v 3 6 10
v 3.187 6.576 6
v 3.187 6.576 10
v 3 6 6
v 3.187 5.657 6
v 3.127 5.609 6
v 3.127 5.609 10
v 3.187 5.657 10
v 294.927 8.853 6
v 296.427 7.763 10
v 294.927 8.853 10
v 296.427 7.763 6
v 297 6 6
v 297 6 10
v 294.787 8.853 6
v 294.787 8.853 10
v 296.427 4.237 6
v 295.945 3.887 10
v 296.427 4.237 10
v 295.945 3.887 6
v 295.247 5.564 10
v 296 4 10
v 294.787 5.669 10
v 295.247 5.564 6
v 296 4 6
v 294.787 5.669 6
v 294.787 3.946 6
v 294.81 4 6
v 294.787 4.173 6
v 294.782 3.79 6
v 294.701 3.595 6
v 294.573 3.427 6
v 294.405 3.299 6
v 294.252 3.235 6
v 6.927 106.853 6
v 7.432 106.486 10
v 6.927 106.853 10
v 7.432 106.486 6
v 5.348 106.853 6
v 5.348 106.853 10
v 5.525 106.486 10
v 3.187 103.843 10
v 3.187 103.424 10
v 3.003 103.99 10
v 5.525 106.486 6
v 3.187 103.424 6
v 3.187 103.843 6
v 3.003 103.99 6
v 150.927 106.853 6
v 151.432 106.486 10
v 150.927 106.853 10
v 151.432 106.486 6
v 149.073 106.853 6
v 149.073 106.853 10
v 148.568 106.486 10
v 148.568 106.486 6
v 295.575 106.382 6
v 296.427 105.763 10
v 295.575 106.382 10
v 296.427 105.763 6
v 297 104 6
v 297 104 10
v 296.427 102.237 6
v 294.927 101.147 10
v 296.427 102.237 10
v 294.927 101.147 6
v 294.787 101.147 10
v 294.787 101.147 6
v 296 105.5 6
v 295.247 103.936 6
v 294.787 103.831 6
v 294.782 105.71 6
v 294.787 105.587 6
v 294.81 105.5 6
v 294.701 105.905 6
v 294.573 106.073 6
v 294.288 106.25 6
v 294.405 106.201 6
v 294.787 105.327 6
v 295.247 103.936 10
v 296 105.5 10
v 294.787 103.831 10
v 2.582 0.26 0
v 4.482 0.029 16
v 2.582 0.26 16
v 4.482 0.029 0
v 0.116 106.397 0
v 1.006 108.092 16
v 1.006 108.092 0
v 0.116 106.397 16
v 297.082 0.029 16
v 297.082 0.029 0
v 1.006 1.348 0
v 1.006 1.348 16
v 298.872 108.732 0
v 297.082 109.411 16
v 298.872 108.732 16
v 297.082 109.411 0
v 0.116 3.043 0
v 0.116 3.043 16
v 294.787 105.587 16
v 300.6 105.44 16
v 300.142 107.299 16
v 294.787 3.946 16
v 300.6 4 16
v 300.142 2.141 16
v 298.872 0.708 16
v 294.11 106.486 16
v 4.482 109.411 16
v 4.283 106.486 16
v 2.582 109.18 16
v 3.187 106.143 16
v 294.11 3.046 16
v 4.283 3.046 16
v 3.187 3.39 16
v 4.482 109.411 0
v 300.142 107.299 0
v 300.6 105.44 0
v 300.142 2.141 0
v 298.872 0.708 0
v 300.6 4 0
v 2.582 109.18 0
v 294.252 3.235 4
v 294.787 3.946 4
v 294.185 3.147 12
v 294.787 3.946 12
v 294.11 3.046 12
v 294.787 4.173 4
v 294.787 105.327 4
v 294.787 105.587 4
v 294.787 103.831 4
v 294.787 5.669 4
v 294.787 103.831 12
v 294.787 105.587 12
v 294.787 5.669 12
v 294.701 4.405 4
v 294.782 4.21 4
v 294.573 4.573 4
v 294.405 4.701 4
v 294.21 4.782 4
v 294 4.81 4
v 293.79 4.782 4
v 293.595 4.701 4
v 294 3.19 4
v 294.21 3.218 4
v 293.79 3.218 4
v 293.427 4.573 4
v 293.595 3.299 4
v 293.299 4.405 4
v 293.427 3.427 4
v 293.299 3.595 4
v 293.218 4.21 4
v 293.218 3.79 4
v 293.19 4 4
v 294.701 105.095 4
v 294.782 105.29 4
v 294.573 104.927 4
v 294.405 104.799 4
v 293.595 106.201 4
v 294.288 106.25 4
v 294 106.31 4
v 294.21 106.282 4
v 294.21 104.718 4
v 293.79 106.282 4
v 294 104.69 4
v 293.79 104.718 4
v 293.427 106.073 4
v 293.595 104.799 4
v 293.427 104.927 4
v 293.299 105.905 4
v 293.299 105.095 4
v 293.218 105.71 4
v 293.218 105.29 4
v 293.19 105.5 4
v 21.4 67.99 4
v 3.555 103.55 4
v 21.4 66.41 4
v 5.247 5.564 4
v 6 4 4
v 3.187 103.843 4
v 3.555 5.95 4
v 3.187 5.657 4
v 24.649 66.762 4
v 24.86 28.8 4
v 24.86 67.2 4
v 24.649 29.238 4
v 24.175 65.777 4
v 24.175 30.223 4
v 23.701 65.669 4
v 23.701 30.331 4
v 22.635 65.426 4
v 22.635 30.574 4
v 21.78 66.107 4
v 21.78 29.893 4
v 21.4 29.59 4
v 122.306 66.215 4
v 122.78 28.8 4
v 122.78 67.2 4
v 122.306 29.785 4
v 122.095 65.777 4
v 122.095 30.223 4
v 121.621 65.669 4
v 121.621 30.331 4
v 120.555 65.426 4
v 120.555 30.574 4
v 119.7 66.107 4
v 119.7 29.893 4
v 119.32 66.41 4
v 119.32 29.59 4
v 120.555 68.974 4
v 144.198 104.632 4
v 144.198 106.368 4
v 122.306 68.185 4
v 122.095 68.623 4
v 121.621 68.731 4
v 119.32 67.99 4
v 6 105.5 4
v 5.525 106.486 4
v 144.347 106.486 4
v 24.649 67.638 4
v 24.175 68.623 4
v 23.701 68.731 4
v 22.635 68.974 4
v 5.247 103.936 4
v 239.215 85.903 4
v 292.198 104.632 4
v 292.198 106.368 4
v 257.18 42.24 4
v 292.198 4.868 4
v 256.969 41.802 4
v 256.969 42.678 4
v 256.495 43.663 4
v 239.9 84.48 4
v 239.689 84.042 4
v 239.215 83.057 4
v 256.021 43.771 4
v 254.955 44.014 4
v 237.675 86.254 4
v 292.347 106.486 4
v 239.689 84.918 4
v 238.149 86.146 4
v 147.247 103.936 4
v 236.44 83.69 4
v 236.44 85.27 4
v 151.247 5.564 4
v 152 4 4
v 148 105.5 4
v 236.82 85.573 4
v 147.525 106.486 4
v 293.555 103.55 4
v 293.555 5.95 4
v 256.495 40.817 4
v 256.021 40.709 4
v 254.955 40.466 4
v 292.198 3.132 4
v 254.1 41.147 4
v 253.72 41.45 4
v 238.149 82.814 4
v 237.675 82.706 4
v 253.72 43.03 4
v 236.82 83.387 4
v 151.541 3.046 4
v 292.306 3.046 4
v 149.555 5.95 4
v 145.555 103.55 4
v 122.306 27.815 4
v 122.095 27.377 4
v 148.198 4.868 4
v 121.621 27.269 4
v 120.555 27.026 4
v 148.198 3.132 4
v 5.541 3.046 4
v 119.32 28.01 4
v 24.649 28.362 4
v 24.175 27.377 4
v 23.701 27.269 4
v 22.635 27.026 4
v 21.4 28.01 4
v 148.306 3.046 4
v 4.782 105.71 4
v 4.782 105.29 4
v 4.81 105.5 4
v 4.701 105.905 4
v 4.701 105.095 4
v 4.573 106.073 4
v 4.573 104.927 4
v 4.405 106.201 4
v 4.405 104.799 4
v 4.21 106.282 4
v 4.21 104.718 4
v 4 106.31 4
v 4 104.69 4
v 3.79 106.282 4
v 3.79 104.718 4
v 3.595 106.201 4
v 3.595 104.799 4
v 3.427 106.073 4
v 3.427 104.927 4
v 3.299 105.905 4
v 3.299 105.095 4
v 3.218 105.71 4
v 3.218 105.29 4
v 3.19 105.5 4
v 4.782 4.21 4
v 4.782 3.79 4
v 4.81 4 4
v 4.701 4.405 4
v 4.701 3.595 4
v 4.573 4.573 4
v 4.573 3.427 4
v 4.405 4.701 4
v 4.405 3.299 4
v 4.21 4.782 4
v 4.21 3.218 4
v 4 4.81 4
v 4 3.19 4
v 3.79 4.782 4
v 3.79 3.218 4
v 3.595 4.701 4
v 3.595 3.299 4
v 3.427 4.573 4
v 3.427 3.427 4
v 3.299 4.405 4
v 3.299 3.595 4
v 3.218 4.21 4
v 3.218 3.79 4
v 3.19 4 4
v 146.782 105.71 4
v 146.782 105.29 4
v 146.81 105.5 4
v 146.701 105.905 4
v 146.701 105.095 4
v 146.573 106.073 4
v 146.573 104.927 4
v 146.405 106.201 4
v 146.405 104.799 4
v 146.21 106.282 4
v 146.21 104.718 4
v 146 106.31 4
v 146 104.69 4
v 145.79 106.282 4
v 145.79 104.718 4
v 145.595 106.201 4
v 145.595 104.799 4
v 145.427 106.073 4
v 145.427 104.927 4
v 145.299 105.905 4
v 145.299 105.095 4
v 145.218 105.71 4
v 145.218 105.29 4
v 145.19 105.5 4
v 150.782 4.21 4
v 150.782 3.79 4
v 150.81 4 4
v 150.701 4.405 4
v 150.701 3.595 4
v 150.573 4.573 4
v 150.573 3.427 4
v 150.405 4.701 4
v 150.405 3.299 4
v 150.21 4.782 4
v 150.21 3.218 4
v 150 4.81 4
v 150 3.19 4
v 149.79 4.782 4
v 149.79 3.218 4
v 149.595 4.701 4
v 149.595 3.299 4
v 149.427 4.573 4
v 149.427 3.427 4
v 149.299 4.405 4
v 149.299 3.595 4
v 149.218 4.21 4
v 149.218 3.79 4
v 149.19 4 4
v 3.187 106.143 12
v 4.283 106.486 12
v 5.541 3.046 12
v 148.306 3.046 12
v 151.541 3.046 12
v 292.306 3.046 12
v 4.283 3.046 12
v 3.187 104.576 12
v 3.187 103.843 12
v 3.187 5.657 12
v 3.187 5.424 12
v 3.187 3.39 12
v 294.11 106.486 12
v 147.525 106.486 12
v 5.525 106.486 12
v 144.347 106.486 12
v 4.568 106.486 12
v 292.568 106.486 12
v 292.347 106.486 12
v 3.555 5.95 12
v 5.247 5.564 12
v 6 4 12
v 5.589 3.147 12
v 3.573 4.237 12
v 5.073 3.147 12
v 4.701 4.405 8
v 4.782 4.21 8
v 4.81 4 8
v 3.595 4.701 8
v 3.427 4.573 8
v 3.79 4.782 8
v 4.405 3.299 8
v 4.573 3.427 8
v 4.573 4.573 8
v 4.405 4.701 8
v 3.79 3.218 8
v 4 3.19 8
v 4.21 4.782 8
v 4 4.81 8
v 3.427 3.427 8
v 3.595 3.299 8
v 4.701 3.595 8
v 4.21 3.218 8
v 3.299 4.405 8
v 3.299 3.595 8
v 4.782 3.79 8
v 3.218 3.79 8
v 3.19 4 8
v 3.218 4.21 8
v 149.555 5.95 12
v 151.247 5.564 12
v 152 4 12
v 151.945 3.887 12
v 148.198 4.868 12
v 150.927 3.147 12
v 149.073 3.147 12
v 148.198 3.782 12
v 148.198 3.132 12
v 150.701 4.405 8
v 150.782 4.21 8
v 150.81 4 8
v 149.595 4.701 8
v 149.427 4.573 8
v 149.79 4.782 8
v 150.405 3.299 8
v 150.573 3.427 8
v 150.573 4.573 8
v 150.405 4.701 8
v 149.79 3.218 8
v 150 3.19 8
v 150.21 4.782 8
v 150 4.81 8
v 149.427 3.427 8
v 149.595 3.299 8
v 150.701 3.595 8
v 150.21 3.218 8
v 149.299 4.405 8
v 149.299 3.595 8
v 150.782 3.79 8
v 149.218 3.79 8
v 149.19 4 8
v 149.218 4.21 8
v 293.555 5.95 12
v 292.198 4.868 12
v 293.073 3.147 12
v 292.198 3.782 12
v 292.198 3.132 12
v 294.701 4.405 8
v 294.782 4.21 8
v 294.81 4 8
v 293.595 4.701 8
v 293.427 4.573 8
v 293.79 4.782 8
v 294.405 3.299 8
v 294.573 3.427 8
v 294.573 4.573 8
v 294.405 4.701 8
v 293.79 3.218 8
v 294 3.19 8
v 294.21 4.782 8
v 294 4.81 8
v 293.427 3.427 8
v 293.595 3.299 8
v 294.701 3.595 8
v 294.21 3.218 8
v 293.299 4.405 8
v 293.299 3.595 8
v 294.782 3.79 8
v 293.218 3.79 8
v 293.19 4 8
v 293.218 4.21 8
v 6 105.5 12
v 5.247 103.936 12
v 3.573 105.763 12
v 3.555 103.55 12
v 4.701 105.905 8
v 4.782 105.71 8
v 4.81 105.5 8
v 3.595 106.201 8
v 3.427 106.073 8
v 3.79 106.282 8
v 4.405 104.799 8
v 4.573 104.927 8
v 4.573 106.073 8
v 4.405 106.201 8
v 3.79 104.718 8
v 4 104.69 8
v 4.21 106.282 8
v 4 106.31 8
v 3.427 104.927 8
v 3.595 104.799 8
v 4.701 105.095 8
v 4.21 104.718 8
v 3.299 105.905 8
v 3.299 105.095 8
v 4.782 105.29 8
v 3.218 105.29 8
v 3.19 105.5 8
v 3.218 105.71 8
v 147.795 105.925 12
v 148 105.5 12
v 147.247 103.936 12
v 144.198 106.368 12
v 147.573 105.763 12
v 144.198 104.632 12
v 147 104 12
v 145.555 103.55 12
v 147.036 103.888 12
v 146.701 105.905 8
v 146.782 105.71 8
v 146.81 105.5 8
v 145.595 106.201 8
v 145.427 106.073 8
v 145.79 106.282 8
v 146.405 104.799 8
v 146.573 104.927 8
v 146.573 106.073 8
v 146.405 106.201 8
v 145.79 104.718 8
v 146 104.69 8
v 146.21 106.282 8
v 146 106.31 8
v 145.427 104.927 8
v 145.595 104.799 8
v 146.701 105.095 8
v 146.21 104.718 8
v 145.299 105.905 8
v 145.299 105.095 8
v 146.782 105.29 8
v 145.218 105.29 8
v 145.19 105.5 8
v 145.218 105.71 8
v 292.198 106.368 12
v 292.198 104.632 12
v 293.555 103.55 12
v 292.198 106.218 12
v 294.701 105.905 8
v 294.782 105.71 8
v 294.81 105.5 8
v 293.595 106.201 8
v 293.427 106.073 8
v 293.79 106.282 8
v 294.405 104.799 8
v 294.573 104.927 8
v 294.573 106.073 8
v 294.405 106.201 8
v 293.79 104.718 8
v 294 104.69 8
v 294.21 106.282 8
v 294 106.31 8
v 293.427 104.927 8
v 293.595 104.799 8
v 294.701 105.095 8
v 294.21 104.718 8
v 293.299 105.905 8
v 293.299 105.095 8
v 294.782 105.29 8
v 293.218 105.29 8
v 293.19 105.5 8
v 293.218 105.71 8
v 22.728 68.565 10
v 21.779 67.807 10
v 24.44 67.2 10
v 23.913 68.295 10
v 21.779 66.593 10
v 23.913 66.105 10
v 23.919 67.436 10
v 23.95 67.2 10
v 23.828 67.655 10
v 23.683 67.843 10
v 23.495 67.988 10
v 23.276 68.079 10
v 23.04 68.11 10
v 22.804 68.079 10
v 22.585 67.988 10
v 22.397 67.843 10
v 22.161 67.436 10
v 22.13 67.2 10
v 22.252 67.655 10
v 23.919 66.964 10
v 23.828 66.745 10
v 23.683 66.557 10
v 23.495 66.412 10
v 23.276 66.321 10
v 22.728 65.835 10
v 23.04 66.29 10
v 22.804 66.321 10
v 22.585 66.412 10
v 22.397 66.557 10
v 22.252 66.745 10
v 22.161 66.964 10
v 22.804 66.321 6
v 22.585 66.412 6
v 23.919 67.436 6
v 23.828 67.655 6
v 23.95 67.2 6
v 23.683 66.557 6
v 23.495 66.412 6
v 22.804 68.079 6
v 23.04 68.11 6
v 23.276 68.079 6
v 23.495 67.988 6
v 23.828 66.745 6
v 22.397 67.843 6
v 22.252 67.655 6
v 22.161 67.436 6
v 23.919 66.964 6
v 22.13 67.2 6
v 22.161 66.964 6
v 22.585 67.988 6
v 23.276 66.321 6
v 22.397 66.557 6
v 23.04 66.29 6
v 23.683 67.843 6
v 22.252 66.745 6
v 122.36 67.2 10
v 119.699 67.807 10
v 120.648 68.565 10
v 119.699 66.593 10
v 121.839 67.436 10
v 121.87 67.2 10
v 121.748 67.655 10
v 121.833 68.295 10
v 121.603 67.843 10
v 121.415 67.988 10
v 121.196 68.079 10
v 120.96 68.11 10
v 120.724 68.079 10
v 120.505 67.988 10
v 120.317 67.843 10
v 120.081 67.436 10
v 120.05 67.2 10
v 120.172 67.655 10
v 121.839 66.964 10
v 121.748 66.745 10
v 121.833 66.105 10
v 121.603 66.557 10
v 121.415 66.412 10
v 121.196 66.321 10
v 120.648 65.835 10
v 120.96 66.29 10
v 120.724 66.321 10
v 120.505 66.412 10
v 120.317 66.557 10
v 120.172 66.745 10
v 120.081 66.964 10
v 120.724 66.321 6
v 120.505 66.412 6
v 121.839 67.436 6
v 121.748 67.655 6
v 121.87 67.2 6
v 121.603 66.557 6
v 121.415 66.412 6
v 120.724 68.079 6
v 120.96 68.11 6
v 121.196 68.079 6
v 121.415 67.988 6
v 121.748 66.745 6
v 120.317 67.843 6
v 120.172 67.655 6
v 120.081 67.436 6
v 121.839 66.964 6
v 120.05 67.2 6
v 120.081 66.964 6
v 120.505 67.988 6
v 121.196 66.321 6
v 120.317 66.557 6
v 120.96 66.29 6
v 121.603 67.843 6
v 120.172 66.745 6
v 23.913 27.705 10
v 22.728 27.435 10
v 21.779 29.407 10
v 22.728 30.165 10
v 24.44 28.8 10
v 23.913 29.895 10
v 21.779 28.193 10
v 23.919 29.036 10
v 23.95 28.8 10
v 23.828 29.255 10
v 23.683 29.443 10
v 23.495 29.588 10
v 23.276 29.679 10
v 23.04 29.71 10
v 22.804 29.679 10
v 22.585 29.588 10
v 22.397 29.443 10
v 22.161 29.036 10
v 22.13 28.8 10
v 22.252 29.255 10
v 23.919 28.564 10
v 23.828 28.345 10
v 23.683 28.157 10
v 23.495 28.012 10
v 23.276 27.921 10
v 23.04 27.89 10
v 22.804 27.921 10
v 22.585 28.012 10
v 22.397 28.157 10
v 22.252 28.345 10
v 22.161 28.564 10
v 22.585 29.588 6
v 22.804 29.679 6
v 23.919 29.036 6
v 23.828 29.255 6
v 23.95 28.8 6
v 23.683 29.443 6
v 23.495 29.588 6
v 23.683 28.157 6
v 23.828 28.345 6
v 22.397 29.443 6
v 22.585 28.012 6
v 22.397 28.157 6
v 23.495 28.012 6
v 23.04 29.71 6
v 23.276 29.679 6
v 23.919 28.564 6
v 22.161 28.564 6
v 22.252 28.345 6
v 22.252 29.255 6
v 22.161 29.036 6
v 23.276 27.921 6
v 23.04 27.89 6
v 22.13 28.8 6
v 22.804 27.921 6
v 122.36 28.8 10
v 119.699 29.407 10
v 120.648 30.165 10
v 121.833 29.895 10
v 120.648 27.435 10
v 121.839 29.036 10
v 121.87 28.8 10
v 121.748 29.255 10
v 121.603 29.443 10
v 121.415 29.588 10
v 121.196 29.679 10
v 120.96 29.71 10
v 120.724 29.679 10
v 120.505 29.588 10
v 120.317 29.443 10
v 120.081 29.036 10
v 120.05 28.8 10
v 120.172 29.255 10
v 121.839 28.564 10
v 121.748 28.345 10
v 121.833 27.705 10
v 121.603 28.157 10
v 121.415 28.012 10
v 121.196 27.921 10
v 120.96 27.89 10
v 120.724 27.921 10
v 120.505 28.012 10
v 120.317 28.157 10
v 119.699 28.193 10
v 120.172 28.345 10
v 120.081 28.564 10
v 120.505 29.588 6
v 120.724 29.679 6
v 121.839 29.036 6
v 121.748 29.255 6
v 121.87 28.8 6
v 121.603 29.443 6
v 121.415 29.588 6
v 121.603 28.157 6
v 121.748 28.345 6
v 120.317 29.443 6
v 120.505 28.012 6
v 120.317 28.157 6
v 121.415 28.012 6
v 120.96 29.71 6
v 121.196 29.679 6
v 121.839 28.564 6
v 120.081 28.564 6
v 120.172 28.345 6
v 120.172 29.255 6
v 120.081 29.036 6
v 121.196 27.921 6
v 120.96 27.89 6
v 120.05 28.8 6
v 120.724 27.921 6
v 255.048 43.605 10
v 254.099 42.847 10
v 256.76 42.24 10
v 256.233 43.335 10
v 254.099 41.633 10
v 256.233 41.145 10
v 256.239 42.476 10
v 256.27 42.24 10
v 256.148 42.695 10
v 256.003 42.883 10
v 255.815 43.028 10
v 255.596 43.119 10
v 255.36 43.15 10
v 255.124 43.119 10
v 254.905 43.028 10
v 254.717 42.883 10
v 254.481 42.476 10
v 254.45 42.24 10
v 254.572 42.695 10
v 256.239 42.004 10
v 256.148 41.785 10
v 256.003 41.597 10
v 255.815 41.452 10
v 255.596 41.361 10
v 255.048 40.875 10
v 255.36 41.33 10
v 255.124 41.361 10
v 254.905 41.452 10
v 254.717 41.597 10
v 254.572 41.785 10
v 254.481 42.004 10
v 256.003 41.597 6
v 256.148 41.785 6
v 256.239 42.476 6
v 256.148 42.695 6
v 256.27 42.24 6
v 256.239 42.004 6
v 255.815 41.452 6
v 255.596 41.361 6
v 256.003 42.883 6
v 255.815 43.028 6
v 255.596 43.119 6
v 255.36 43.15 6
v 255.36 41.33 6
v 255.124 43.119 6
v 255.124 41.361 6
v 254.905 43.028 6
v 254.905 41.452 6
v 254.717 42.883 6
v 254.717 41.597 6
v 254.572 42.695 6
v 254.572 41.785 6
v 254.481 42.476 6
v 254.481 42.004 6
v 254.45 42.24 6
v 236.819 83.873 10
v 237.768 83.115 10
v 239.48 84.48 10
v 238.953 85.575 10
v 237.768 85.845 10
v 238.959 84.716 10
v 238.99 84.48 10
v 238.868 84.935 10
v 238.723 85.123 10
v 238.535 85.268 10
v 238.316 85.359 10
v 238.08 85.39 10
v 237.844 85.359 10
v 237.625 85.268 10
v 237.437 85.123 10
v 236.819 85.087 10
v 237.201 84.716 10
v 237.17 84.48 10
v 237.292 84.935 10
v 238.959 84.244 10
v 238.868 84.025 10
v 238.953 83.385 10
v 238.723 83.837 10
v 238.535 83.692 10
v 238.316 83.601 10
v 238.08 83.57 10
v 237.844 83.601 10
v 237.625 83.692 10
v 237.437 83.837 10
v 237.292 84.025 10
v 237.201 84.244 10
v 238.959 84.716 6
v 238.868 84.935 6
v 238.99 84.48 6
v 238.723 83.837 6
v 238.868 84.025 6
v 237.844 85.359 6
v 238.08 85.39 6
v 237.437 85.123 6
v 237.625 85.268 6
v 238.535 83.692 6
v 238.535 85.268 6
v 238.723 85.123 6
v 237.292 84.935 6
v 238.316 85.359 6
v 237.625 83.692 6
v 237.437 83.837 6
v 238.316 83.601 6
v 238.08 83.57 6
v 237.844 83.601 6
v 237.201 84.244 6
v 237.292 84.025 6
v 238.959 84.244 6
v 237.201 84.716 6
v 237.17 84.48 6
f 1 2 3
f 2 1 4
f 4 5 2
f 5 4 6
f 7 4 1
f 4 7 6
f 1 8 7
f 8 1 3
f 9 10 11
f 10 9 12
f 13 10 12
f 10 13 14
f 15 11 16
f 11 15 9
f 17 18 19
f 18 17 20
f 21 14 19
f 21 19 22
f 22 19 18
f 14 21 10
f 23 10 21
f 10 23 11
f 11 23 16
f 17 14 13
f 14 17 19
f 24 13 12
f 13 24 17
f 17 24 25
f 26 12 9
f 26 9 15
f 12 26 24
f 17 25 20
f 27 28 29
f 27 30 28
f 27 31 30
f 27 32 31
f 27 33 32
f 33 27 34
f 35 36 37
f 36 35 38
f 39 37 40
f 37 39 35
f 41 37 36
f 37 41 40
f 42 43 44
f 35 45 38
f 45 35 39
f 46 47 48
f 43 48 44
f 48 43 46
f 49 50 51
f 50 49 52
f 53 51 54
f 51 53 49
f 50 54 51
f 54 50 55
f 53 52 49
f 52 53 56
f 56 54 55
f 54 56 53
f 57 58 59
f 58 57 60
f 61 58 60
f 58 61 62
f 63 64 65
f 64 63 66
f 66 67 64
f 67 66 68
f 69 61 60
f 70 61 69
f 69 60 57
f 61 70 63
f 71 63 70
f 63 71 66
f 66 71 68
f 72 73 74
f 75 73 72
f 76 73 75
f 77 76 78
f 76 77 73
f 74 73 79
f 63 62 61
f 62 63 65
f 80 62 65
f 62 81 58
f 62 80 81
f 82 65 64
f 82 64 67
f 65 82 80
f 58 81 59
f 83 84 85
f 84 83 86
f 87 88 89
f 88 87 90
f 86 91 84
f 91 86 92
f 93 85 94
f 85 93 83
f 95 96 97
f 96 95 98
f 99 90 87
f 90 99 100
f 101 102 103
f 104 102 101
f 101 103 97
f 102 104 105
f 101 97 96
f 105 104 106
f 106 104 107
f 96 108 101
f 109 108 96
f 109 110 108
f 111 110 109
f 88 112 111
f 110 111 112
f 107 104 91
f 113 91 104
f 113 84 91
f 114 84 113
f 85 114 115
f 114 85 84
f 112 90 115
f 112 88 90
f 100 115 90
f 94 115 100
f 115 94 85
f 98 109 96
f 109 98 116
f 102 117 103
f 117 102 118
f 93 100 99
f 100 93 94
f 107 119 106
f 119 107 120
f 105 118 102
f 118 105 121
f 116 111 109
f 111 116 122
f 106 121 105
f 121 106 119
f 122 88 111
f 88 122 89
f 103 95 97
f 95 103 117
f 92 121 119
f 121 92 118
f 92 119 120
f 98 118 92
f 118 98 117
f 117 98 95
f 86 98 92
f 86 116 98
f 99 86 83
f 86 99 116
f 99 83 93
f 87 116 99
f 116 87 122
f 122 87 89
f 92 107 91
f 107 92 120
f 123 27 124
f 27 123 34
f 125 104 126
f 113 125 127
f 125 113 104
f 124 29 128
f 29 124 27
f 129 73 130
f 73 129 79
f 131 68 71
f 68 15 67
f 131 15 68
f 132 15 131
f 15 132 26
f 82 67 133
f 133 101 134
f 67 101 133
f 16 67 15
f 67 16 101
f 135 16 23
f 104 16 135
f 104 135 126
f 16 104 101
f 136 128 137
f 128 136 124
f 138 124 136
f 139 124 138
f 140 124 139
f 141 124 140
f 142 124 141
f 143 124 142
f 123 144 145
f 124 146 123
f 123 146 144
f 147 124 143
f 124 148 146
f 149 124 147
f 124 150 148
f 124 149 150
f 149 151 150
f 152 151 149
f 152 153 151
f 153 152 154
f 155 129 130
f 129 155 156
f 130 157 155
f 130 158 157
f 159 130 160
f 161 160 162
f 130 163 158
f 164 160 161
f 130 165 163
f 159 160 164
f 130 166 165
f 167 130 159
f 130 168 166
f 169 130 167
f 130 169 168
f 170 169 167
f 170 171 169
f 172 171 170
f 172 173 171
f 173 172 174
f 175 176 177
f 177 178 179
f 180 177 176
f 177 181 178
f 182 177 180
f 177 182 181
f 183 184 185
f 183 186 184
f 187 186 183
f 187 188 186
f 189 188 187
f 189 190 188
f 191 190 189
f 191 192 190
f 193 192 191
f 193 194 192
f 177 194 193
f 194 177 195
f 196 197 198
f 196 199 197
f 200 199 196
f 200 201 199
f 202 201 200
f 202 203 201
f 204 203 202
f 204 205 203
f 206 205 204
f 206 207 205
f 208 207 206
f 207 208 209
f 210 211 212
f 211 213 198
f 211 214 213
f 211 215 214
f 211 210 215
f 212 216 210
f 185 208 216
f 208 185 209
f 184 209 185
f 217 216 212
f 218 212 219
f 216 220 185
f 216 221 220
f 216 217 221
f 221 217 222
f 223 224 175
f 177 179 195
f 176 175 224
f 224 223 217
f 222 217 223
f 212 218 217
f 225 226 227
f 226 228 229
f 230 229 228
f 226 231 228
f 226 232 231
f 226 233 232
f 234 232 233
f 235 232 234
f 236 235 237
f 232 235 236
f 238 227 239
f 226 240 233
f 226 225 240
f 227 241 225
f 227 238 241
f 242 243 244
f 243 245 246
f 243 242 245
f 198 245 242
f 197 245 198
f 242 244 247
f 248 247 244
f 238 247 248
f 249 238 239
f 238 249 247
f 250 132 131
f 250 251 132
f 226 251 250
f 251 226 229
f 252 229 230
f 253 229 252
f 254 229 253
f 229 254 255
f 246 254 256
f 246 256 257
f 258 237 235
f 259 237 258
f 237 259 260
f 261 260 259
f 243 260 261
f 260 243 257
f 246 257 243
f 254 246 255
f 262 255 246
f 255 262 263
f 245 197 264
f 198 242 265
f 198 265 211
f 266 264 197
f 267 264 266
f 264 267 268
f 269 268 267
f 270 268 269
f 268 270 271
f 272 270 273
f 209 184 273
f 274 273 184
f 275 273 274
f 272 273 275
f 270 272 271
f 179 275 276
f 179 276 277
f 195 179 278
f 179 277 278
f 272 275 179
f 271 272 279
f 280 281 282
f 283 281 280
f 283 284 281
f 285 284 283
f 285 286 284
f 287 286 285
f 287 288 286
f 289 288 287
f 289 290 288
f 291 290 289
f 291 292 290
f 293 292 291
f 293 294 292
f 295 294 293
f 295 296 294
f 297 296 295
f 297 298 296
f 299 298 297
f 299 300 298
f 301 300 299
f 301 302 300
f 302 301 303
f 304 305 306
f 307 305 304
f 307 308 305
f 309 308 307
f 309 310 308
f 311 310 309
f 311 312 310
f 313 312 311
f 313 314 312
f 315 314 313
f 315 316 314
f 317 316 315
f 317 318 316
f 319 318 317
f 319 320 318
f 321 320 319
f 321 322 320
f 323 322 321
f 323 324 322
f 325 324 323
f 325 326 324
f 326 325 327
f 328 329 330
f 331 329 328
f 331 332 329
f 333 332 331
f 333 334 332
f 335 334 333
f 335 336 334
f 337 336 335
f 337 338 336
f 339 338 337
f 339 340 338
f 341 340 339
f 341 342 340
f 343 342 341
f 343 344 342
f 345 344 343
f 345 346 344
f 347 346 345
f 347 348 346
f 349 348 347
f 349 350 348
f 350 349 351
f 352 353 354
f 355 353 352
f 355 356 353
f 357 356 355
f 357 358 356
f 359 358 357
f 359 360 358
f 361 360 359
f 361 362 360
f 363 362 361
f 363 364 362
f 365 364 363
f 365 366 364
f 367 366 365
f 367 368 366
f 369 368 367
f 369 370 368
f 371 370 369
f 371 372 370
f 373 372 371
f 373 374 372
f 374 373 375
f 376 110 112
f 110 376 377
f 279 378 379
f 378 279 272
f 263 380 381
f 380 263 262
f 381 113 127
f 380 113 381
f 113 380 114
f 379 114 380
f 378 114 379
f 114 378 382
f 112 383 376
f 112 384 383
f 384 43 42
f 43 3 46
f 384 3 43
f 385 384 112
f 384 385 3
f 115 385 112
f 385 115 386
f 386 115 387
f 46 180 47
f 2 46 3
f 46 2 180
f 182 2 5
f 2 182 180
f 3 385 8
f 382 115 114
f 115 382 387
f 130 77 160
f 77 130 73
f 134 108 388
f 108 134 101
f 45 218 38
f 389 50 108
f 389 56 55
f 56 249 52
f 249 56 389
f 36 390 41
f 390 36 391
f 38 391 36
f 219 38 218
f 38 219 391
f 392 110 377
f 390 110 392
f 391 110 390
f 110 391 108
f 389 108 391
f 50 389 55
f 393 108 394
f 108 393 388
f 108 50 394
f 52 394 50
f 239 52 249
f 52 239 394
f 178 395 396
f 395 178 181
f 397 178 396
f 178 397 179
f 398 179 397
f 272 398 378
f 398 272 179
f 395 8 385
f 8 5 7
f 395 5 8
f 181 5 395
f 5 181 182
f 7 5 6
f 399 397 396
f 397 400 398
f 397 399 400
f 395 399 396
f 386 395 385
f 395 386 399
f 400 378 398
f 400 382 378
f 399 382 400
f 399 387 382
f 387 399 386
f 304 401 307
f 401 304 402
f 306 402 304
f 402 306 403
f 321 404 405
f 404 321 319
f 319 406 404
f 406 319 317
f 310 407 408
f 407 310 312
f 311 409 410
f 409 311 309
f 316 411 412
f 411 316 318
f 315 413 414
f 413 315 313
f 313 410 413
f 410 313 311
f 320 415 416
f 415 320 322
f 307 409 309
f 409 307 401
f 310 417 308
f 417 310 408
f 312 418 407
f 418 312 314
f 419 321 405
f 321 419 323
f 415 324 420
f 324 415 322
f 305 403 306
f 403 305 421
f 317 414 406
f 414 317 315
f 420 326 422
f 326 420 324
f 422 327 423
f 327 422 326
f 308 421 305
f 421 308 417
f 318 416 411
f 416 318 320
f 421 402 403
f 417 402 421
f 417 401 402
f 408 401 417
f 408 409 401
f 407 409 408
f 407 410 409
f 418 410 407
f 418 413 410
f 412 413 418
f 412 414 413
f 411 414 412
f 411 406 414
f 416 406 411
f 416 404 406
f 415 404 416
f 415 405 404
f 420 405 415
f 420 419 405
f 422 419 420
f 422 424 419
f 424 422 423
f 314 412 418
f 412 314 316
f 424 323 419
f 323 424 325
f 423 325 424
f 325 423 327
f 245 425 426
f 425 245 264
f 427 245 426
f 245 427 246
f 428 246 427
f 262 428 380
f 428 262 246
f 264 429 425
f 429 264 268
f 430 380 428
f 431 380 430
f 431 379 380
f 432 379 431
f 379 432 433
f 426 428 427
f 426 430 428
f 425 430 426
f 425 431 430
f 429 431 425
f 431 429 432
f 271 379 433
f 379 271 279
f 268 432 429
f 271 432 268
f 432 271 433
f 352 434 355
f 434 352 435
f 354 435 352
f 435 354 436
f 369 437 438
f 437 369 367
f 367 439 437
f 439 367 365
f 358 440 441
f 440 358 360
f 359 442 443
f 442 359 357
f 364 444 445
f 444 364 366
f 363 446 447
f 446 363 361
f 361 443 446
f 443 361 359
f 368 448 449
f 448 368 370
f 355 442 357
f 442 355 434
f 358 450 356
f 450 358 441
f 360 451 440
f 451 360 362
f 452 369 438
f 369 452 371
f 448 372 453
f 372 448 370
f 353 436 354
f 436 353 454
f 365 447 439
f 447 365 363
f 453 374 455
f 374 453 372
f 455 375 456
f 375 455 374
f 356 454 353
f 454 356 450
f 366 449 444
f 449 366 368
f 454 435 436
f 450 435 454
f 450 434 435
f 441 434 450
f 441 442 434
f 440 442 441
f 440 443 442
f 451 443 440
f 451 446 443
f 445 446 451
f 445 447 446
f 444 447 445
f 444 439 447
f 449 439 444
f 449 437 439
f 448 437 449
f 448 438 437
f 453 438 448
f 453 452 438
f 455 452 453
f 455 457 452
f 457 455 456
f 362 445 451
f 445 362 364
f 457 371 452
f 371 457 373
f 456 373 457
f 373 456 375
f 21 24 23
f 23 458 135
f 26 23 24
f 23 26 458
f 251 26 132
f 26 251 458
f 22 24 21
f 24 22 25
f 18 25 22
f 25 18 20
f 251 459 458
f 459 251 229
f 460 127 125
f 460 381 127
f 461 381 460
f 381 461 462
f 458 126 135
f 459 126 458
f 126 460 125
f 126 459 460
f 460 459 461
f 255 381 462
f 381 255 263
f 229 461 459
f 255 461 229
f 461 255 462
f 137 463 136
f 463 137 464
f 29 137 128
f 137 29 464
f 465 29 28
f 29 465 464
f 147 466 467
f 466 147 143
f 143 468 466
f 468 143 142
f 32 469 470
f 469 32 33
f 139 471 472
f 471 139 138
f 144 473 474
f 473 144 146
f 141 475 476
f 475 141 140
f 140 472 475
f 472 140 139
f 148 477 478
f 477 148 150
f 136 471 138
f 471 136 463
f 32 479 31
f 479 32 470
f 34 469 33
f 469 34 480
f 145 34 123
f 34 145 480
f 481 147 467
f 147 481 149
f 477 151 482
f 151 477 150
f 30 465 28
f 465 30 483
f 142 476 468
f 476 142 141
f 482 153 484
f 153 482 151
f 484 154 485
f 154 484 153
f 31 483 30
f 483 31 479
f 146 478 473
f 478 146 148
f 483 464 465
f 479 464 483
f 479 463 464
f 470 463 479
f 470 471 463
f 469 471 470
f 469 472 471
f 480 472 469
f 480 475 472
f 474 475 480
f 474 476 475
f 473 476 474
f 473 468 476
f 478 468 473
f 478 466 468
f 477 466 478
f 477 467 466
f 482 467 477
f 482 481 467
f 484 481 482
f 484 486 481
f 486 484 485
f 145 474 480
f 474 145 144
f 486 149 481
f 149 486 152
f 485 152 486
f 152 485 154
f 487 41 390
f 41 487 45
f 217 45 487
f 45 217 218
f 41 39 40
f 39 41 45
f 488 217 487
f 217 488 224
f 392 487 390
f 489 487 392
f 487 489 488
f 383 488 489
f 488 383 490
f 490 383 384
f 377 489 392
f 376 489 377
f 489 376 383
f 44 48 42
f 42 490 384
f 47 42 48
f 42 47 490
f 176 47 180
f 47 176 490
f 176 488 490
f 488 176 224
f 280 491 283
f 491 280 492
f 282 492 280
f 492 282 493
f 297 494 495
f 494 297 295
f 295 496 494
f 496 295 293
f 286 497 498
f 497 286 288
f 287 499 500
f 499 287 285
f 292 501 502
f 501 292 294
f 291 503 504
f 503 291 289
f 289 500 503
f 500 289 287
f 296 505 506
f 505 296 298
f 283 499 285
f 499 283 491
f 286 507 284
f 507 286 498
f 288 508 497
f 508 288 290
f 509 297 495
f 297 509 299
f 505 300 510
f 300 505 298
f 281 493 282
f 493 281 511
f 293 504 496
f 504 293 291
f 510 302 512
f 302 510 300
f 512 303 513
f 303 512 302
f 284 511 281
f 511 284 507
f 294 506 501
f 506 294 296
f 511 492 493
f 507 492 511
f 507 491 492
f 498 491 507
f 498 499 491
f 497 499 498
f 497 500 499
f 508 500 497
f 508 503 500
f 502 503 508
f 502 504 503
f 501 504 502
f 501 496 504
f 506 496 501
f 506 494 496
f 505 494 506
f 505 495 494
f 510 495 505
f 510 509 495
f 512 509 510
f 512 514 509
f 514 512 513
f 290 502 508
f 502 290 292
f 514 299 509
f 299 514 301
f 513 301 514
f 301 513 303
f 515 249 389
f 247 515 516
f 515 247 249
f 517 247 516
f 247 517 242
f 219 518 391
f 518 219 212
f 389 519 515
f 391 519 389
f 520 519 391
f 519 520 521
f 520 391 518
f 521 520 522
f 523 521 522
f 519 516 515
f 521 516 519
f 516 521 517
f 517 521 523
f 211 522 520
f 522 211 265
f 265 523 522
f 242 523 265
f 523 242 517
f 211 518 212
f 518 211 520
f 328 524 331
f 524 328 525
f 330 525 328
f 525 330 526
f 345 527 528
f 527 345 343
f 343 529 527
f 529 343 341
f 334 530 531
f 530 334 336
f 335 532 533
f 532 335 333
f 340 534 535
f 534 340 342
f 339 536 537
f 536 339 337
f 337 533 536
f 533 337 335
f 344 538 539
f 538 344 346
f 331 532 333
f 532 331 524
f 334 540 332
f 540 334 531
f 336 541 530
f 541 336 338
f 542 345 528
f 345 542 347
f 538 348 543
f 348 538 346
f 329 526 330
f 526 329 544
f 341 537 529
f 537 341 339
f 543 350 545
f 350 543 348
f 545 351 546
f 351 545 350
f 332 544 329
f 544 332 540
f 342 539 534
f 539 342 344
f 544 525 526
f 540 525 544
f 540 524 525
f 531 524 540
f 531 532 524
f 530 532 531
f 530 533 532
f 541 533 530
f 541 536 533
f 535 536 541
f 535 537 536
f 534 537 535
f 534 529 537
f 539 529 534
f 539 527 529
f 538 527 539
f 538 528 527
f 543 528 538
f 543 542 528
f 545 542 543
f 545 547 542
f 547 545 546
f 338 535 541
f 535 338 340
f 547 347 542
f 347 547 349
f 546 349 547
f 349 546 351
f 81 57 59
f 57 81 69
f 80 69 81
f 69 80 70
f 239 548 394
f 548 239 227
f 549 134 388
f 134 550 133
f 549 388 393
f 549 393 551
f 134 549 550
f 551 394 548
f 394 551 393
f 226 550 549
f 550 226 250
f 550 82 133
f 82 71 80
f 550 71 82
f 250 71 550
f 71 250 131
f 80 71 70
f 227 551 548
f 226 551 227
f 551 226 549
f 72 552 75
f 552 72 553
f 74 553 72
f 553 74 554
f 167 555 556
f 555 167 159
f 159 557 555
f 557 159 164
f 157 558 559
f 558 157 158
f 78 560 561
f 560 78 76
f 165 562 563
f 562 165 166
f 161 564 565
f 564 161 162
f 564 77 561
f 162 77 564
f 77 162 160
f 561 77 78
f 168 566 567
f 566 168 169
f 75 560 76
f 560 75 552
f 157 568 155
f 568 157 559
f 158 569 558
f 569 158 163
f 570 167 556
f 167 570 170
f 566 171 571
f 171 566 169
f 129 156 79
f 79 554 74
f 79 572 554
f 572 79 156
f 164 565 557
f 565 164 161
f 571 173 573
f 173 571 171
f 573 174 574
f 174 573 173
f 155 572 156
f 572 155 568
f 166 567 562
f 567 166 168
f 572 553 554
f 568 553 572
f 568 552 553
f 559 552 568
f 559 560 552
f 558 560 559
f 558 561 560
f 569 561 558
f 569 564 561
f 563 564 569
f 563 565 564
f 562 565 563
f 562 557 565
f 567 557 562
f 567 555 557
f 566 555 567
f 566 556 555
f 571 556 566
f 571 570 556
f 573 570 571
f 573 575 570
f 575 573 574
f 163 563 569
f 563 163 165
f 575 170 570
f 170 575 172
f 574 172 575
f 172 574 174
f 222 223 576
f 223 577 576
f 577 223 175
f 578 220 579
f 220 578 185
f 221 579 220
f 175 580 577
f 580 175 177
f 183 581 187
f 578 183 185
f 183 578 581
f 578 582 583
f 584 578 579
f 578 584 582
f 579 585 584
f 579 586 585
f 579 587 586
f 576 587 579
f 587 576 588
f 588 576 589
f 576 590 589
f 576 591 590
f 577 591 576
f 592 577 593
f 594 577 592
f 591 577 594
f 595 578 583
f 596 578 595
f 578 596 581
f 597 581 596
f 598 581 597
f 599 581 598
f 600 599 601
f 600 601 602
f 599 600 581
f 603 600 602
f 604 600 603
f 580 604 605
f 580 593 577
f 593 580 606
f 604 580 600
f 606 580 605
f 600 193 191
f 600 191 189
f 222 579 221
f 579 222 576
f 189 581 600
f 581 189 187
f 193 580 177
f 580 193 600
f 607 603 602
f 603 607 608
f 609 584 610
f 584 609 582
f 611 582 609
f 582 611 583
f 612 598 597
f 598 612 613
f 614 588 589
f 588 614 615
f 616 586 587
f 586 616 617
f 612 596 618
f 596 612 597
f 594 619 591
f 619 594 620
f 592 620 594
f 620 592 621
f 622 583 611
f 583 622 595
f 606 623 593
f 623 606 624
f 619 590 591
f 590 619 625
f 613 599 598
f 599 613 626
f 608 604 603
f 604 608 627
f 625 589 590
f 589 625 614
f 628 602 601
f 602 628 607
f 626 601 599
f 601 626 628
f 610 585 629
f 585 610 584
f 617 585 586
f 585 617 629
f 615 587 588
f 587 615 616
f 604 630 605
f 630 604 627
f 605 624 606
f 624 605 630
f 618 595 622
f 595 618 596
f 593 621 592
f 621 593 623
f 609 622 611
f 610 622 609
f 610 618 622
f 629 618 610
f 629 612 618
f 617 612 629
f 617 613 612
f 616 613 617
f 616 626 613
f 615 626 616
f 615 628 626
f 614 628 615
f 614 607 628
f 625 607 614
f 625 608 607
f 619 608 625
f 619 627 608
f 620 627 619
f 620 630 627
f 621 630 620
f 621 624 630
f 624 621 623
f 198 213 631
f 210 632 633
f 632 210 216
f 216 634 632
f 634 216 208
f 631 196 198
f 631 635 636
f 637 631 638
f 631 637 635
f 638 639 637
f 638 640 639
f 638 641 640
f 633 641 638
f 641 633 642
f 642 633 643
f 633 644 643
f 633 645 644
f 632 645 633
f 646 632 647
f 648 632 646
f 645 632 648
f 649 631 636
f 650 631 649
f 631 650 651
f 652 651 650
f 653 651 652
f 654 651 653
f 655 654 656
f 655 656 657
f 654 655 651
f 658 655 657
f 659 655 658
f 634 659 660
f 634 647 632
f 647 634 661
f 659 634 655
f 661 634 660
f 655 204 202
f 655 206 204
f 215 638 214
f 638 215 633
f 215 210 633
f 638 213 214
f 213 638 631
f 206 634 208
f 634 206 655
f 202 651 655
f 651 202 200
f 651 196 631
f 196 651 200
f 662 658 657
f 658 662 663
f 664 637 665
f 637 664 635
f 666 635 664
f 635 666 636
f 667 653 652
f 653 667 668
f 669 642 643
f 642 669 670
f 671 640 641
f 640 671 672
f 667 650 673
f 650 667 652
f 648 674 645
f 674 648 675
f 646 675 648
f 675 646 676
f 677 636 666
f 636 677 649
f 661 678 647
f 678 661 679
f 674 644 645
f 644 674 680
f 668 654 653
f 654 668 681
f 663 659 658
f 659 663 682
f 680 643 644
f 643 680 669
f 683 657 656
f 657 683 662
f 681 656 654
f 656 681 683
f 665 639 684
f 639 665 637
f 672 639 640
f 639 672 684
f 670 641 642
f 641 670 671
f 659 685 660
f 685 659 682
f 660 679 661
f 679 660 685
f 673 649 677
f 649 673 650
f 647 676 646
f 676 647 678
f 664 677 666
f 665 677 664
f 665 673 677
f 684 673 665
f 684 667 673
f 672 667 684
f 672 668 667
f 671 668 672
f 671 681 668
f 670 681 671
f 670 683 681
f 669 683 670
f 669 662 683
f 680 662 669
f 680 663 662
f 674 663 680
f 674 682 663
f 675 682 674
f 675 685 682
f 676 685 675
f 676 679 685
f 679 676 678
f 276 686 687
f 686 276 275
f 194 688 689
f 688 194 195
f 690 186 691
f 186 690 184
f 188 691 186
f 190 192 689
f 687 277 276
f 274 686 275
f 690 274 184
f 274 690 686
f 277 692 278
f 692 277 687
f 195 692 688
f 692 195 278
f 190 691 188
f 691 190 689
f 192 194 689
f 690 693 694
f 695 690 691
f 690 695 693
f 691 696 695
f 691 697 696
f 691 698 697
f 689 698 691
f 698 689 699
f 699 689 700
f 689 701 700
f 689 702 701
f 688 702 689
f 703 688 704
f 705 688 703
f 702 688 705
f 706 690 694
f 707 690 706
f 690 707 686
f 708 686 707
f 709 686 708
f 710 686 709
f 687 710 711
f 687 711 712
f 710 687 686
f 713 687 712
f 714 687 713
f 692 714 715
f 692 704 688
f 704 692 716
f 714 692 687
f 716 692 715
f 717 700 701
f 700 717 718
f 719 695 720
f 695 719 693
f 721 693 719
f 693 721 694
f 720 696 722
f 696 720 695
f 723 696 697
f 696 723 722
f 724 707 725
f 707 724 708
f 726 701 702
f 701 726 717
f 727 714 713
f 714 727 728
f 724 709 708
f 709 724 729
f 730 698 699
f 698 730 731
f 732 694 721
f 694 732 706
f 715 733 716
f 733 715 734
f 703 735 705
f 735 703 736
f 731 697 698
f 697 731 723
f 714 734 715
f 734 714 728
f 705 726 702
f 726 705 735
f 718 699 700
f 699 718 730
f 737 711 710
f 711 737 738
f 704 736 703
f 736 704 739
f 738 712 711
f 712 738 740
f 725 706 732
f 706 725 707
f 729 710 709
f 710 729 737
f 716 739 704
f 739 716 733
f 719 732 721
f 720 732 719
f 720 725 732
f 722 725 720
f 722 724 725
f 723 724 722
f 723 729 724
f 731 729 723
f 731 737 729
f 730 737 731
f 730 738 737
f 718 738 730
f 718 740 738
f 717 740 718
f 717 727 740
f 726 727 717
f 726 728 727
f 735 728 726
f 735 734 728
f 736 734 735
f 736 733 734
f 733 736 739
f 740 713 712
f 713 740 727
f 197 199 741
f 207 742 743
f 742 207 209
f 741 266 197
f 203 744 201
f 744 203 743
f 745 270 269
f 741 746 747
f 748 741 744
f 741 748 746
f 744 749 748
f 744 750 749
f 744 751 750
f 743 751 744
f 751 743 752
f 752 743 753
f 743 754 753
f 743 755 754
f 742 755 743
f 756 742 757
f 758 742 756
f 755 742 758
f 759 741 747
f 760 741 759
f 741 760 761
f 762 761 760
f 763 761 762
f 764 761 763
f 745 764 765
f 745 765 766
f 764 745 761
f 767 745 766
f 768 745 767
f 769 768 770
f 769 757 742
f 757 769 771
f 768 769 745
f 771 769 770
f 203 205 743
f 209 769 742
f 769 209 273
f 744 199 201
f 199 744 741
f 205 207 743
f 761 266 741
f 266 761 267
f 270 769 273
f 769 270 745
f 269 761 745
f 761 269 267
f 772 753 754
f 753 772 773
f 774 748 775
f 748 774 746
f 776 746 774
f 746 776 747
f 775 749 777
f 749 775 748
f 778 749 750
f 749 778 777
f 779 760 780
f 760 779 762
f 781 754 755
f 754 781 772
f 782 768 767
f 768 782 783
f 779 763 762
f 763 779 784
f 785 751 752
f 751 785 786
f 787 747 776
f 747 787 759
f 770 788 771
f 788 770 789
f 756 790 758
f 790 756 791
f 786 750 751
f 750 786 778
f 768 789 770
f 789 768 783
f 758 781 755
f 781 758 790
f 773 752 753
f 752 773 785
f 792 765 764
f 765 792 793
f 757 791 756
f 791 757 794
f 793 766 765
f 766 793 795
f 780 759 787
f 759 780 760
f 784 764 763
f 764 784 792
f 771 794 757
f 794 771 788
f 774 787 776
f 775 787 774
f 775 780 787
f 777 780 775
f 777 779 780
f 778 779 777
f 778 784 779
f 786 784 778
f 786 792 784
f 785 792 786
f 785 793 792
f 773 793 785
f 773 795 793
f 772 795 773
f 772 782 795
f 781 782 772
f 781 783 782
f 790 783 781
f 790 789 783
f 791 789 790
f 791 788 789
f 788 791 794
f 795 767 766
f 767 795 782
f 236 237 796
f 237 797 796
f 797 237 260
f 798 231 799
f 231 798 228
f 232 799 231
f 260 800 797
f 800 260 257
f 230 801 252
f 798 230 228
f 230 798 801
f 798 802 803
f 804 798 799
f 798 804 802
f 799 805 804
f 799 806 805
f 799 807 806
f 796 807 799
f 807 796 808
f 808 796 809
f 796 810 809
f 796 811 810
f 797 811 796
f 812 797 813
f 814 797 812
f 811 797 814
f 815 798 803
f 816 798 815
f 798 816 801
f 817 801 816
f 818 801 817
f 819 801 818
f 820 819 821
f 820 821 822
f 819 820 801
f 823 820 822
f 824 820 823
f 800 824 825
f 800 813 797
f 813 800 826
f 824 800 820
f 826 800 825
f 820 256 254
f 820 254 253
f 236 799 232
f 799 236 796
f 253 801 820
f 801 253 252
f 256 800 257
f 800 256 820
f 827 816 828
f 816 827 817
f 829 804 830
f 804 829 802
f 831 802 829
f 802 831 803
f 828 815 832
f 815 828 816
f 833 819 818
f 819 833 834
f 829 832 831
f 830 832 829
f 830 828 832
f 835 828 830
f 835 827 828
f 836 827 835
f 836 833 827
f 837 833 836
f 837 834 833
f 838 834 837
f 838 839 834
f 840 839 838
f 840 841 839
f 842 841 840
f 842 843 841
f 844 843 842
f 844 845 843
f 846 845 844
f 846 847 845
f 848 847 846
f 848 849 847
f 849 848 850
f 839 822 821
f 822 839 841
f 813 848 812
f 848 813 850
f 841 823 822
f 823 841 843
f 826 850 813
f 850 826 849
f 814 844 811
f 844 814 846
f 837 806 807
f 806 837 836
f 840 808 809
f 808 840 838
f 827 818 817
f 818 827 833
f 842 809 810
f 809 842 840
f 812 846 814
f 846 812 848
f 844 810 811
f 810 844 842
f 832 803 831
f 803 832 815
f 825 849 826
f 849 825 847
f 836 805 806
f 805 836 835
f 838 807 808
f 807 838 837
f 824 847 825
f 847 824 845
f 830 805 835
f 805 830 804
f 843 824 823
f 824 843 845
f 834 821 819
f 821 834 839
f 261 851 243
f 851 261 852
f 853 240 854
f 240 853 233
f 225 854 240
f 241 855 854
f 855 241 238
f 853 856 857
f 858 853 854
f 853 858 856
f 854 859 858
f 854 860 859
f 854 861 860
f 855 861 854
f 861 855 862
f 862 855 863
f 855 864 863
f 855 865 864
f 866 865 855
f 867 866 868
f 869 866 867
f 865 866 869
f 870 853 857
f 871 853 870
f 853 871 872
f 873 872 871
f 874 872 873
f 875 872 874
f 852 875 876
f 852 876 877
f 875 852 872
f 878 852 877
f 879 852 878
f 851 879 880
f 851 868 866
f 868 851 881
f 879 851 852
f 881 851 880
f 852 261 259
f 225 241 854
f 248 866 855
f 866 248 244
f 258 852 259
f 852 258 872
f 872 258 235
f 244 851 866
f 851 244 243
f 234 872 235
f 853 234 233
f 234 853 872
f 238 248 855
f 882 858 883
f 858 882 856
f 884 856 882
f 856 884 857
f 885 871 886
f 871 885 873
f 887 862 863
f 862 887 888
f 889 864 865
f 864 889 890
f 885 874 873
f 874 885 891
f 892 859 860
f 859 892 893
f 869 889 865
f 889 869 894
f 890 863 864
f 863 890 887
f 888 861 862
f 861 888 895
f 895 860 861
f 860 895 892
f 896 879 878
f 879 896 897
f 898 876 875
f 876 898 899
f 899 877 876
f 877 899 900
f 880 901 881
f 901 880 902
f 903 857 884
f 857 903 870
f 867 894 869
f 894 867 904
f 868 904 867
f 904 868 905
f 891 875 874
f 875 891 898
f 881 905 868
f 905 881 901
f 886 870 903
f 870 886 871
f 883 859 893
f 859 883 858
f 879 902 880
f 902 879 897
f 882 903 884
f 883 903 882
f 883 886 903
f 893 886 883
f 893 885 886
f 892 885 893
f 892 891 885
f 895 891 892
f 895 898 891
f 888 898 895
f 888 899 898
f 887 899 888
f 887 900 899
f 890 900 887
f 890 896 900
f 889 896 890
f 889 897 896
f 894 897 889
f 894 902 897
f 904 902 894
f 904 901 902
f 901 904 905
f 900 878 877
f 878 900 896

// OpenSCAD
//Thickness of entire plate
plateThickness = 6;
//Unit square length, from Cherry MX data sheet
lkey = 19.2;
//Hole size, from Cherry MX data sheet
holesize = 14;

//length, in units, of board
width = 15.5;
//Height, in units, of board
height = 5.7;

//Radius of mounting holes
mountingholeradius = 1.11;
//height of switch clasp cutouts
cutoutheight = 3;
//width of switch clasp cutouts
cutoutwidth = 1;

//calculated vars
holediff = lkey - holesize;
w = width * lkey;
h = height * lkey;

TOP_PLATE_FILE = "top_plate_rev5.dxf";


layout = [
//start column 0
[[0,0],1.5],
  [[0,1],1.5],
  [[0,2],1.5],
  [[0,3],1.5],
  [[0,4],1.5],
  //start column 1
  [[1.5,0],1],
  [[1.5,1],1],
  [[1.5,2],1],
  [[1.5,3],1],
  [[1.5,4],1],
  //start column 2
  [[2.5,0],1],
  [[2.5,1],1],
  [[2.5,2],1],
  [[2.5,3],1],
  [[2.5,4],1],
  //start column 3
  [[3.5,0],1],
  [[3.5,1],1],
  [[3.5,2],1],
  [[3.5,3],1],
  [[3.5,4],1],
  //start column 4
  [[4.5,0],1],
  [[4.5,1],1],
  [[4.5,2],1],
  [[4.5,3],1],
  [[4.5,4],2],//SPACEBAR
  //start column 5
  [[5.5,0],1],
  [[5.5,1],1],
  [[5.5,2],1],
  [[5.5,3],1],
  //start column 6
  [[7,0],1],
  [[7,1],1],
  [[7,2],1],
  [[7,3],1],
  [[7,4],2],//SPACEBAR
  //start column 7
  [[8,0],1],
  [[8,1],1],
  [[8,2],1],
  [[8,3],1],
  //start column 8
  [[9,0],1],
  [[9,1],1],
  [[9,2],1],
  [[9,3],1],
  [[9,4],1],
  //start column 9
  [[10,0],1],
  [[10,1],1],
  [[10,2],1],
  [[10,3],1],
  [[10,4],1],
  //start column 10
  [[11,0],1],
  [[11,1],1],
  [[11,2],1],
  [[11,3],1],
  [[11,4],1],
  //start column 11
  [[12,0],1],
  [[12,1],1],
  [[12,2],1],
  [[12,3],1],
  [[12,4],1],
  //start column 12
  [[13,0],1],
  [[13,1],1],
  [[13,2],2],//ENTER
  [[13,3],1],
  [[13,4],1],
  //start column 13
  [[14,0],1],
  [[14,1],1],

  [[14,3],1],
  [[14,4],1],
  ];




module plate(xdim, ydim, zdim, rdim) {
  hull() {
    translate([rdim, rdim,0]) cylinder(r=rdim,h=zdim);
    translate([xdim-rdim,rdim,0]) cylinder(r=rdim,h=zdim);
    translate([rdim, ydim-rdim,0]) cylinder(r=rdim,h=zdim);
    translate([xdim-rdim, ydim-rdim,0]) cylinder(r=rdim,h=zdim);
  }
}

holetype = 1;
module holeMatrix(holes, depth, startX, startY){
  depth = 0;
  for (key = holes) {
    translate([
        (lkey * key[0][0]) + startX,
        h - (lkey * (key[0][1]+1)) - startY,// - holesize + h,*/
        depth
        ])
      translate([
          ((lkey * key[1] - holesize ) / 2 ) - holesize/4,
          (lkey - holesize) / 2,
          depth
          ])
      switchSocket(holetype);
  }
}

mounts = [
[1.2, 3.5],
  [6.3, 3.5],
  [1.2, 1.5],
  [6.3, 1.5],
  [13.3, 2.2],
  [12.4, 4.4],
  ];
module mountingholes(offsetX, offsetY){
  for(mount = mounts) {
    translate([(mount[0] * lkey) + offsetX, (mount[1] * lkey) + offsetY, 0])
      cylinder(h=plateThickness,r=mountingholeradius, $fn=24);
  }
}

module switchSocket(holetype){
  if (holetype == 0){
    union(){
      cube([holesize,holesize,plateThickness]);
      translate([-cutoutwidth,1,0])
        cube([holesize+2*cutoutwidth,cutoutheight,plateThickness]);

      translate([-cutoutwidth,holesize-1-cutoutheight,0])
        cube([holesize+2*cutoutwidth,cutoutheight,plateThickness]);
    }
  }
  if (holetype == 1){
    union(){
      cube([holesize,holesize,plateThickness]);

      translate([-cutoutwidth,1,0])
        cube([holesize+2*cutoutwidth,holesize-2,plateThickness]);
    }
  }
  if (holetype == 2){
    cube([holesize,holesize,plateThickness]);
  }
}



module stabilizer(){
  cube([3.3, 14, plateThickness]);
}

module stabilizer2u(x,y,l){
  translate([0+lkey*x, h-lkey-lkey*y, 0])
    translate([(lkey*l-holesize)/2,(lkey - holesize)/2, 0])
    translate([-6.6,-.75,0])
    union(){
      stabilizer();
      translate([3.3 + 20.6,0,0]) stabilizer();
    }
}

module stabilizers() {
  stabilizer2u(4.35, 4, 2);
  stabilizer2u(6.85, 4, 2);
  stabilizer2u(12.85, 2, 2);
}

module screwNozzle(x, y) {
  difference() {
    translate([x, y, 0]) cylinder(h=caseThickness-(plateThickness), r1=2.1, r2=1.4);
    translate([x, y, plateThickness]) cylinder(h=plateThickness, r=mountingholeradius-0.2, $fn=24);

  }
}



module topPlate(holes) {
  offSet = 0;

  difference() {
    /*
       plate(w + paddingX/2, h, plateThickness, 4);
       holeMatrix(holes, plateThickness, 0, 0);
       mountingholes(0, 0);
       stabilizers();
       */
    /*translate([130,0,0]) cube([1000,150,150]);//left side*/
    /*translate([0,0,0]) cube([230,150,150]); // right side*/
  }

  difference() {
    linear_extrude (width=0,height=4) import (TOP_PLATE_FILE);
    //translate([100,0,0]) cube([1000,150,150]);//left side*/
    //translate([200,0,0]) cube([1000,150,150]); // middle side

  }


}

caseThickness = 16;

paddingX = 6;
paddingY = 6;
module bottomCase() {

  difference() {

    plate(w + paddingX/2, h, caseThickness, 4);

    translate([paddingX / 2, paddingY / 2,  (caseThickness/4)])
      resize([w - paddingX, h - paddingY, 0])
      plate(w, h, caseThickness, 1);



    union() {
      translate([6, 6, 6])
        cylinder(h=4, r1=3, r2=3);

      translate([150, 6, 6])
        cylinder(h=4, r1=3, r2=3);

      translate([294, 6, 6])
        cylinder(h=4, r1=3, r2=3);

      translate([6, 104, 6])
        cylinder(h=4, r1=3, r2=3);

      translate([150, 104, 6])
        cylinder(h=4, r1=3, r2=3);

      translate([294, 104, 6])
        cylinder(h=4, r1=3, r2=3);

      translate([2.2, 2.2, caseThickness-4]) linear_extrude (width=0,height=4) import (TOP_PLATE_FILE);
    }

  }


  difference() {

    union() {
      translate([4, 4, 2]) {
        difference() {
          cylinder(h=10, r1=2, r2=2);
          cylinder(h=plateThickness, r=mountingholeradius-0.3, $fn=24);
        }
      }

      translate([150, 4, 2]) {
        difference() {
          cylinder(h=10, r1=2, r2=2);
          cylinder(h=plateThickness, r=mountingholeradius-0.3, $fn=24);
        }
      }

      translate([294, 4, 2]) {
        difference() {
          cylinder(h=10, r1=2, r2=2);
          cylinder(h=plateThickness, r=mountingholeradius-0.3, $fn=24);
        }
      }

      translate([4, 105.5, 2]) {
        difference() {
          cylinder(h=10, r1=2, r2=2);
          cylinder(h=plateThickness, r=mountingholeradius-0.3, $fn=24);
        }
      }

      translate([146, 105.5, 2]) {
        difference() {
          cylinder(h=10, r1=2, r2=2);
          cylinder(h=plateThickness, r=mountingholeradius-0.3, $fn=24);
        }
      }

      translate([294, 105.5, 2]) {
        difference() {
          cylinder(h=10, r1=2, r2=2);
          cylinder(h=plateThickness, r=mountingholeradius-0.3, $fn=24);
        }
      }
    }

    union() {
      translate([6, 6, 12])
        cylinder(h=4, r1=3, r2=3);

      translate([150, 6, 12])
        cylinder(h=4, r1=3, r2=3);

      translate([294, 6, 12])
        cylinder(h=4, r1=3, r2=3);

      translate([6, 104, 12])
        cylinder(h=4, r1=3, r2=3);

      translate([150, 104, 12])
        cylinder(h=4, r1=3, r2=3);

      translate([294, 104, 12])
        cylinder(h=4, r1=3, r2=3);

      translate([2.2, 2.2, caseThickness-4]) linear_extrude (width=0,height=4) import (TOP_PLATE_FILE);
    }




  }

  for(mount = mounts) {
    screwNozzle(mount[0] * lkey, mount[1] * lkey);
  }
}

translate([10, 10, 20]) topPlate();
bottomCase();
